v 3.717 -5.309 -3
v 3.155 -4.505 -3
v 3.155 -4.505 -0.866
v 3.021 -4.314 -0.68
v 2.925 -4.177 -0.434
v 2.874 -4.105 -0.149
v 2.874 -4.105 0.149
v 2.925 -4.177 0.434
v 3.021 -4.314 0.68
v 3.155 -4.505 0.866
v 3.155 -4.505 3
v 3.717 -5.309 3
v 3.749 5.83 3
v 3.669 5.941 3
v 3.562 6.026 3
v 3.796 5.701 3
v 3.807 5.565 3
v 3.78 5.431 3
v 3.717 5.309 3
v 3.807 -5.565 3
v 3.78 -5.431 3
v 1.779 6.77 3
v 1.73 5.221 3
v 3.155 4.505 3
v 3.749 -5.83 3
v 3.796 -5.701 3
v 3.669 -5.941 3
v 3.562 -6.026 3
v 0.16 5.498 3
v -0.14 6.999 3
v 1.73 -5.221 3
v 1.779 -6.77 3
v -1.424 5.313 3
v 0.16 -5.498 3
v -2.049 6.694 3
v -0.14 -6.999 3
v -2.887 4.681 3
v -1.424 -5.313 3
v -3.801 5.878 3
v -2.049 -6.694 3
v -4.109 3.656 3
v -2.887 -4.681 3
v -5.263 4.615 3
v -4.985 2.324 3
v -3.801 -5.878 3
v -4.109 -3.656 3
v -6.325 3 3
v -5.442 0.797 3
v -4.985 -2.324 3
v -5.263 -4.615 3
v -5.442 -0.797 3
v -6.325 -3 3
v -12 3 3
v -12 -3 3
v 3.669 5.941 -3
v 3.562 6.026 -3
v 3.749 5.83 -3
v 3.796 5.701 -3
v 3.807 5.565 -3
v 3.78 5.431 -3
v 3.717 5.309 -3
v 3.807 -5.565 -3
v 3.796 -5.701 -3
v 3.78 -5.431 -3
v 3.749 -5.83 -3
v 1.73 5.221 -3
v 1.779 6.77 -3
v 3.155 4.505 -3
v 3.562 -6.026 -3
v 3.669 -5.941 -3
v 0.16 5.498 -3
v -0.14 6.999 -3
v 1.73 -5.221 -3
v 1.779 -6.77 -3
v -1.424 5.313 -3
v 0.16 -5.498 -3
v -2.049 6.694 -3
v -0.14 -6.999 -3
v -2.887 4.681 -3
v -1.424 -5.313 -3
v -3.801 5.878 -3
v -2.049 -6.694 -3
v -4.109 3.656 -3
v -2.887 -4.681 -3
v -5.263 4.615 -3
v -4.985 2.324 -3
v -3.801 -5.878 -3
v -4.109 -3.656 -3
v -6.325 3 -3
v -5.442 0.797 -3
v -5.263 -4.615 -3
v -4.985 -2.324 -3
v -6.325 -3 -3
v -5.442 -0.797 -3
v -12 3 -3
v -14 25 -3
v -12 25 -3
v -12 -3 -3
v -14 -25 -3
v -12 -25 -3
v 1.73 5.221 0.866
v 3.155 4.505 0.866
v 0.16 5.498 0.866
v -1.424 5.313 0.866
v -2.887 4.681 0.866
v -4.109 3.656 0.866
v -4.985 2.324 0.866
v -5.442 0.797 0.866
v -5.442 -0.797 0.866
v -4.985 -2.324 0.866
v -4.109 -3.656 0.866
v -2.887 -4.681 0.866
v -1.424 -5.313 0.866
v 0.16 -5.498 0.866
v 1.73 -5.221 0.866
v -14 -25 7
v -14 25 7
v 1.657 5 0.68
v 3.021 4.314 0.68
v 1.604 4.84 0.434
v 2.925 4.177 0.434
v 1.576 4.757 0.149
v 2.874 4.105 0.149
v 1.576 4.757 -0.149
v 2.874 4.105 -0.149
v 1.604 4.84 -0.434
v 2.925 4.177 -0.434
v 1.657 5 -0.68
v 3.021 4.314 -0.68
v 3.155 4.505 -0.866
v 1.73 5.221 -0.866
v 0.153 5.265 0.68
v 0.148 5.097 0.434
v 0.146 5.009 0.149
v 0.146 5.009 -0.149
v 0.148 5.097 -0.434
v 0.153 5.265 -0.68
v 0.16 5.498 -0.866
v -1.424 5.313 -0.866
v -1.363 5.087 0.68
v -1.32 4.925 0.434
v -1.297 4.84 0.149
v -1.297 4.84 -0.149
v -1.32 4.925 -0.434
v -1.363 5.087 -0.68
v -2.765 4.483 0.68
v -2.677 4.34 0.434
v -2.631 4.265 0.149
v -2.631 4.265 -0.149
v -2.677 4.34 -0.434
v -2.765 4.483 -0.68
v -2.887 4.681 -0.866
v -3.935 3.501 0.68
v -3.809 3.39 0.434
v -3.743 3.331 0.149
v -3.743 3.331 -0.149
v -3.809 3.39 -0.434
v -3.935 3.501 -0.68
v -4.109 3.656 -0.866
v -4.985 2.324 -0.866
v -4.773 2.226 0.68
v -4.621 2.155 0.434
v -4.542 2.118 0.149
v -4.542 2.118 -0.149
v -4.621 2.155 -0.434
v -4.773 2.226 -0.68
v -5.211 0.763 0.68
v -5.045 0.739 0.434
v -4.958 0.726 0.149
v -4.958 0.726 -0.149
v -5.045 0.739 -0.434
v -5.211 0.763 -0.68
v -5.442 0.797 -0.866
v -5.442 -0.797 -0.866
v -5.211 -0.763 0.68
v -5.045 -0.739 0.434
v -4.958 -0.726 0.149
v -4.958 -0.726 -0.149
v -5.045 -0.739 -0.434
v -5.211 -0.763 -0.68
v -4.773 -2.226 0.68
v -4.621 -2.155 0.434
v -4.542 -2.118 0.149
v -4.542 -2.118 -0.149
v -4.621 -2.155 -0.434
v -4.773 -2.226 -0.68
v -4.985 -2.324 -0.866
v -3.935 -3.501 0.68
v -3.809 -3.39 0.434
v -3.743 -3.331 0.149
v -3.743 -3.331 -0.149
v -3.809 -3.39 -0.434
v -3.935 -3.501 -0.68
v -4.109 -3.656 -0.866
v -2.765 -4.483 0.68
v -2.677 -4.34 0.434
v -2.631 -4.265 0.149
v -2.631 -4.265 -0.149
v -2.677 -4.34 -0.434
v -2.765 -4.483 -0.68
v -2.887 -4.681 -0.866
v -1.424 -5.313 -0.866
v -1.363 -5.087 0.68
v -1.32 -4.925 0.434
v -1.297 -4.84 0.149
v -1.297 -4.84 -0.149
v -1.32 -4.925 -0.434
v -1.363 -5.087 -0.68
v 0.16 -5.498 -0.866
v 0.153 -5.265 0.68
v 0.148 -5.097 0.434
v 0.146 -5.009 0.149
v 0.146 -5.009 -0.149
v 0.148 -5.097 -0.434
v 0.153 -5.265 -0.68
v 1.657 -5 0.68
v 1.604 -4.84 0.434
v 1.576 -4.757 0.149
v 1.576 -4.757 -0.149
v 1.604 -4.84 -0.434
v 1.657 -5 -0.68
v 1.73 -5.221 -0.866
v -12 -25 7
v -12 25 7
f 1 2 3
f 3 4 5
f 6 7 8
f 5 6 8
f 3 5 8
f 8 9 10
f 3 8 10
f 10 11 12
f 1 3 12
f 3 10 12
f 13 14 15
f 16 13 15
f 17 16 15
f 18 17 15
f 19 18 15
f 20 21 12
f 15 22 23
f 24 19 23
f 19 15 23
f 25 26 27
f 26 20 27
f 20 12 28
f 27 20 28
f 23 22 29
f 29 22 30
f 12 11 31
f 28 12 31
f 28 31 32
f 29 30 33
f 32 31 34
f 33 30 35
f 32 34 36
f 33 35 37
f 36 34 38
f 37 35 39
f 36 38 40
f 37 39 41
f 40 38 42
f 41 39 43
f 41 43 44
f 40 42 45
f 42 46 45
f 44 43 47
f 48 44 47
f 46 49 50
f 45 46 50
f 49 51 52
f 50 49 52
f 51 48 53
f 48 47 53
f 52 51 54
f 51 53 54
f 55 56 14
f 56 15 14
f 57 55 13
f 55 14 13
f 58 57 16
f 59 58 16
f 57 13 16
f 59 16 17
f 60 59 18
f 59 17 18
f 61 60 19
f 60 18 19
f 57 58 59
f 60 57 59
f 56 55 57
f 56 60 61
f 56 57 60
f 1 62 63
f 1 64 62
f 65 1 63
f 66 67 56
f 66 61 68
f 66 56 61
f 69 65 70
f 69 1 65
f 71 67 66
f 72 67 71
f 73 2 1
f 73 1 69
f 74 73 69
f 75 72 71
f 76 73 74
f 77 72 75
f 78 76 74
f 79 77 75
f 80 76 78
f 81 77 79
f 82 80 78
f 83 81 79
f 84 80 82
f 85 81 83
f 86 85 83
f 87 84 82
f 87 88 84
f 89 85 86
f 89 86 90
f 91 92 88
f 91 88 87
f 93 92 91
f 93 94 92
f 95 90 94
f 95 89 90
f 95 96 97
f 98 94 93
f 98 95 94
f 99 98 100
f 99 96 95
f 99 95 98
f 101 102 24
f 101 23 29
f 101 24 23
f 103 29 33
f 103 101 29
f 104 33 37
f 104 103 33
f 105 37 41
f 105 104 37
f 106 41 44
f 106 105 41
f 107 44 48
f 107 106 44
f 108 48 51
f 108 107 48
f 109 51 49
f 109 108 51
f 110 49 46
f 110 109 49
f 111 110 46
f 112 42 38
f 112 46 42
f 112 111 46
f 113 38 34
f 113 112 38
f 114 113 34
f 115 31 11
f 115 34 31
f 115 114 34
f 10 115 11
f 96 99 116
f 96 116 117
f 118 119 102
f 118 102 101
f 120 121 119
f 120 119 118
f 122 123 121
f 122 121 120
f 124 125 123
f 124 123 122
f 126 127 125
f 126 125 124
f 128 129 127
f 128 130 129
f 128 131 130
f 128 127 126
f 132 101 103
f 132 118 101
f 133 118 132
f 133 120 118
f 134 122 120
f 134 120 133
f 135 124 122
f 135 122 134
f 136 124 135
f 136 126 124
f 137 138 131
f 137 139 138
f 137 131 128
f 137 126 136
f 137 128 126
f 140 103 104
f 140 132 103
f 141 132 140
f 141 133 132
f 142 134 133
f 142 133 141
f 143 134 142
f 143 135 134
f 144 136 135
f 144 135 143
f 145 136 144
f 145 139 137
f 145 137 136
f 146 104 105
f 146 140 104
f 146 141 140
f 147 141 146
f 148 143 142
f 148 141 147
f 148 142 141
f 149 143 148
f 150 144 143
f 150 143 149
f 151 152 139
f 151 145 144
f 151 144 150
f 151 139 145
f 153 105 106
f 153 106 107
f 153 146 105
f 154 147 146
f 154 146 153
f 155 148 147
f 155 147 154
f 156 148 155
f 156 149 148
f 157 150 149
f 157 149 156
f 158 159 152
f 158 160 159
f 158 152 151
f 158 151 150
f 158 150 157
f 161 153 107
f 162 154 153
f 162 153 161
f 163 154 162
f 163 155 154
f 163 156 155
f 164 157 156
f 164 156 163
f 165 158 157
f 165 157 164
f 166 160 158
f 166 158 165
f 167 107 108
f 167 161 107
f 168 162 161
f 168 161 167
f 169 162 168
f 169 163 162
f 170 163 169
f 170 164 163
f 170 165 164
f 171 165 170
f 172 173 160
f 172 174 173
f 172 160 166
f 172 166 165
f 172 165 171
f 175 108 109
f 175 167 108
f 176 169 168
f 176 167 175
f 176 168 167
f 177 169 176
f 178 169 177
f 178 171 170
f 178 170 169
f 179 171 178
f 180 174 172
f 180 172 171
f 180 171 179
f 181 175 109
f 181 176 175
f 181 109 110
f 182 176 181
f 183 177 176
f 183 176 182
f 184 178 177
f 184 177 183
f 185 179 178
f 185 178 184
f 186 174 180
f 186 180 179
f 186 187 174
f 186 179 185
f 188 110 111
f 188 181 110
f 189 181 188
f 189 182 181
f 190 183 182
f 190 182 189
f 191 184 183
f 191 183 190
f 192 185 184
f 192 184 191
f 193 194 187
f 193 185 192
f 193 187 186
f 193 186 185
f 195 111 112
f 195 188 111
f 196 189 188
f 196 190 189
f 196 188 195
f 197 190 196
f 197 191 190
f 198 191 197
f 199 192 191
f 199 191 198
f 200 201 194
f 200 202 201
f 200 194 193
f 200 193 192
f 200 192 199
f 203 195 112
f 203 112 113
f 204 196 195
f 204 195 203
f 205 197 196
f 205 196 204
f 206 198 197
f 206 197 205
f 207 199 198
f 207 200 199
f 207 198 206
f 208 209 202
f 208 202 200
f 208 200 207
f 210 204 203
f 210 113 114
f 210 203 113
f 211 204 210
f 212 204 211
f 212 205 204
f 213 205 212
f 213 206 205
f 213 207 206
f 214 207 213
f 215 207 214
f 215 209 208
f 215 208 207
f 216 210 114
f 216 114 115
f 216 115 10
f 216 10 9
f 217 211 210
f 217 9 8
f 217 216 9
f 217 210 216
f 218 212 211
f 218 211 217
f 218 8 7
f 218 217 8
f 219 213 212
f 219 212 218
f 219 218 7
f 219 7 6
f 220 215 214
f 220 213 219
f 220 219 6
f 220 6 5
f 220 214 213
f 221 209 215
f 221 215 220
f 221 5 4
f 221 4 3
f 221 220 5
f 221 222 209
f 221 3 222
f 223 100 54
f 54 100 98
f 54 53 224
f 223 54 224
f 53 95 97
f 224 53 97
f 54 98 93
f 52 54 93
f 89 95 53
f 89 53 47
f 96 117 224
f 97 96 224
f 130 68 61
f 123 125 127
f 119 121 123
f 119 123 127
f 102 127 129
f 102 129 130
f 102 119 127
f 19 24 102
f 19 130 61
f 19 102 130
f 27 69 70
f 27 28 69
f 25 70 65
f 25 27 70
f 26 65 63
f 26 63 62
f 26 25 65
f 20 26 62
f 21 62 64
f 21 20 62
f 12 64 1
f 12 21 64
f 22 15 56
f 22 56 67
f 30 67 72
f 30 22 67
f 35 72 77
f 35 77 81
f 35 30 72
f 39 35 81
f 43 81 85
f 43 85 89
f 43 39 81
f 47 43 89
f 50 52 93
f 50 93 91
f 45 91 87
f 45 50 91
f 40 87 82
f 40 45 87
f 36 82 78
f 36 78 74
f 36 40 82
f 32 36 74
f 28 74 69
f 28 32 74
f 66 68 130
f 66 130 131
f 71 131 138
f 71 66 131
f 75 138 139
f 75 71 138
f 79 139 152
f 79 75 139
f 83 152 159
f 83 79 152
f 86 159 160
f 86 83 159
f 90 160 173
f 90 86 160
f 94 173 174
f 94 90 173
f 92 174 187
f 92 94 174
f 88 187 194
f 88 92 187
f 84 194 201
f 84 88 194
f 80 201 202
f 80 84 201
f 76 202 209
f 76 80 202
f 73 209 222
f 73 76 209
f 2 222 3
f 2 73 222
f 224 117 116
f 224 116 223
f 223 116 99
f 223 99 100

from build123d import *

# Parameters (mm, degrees)
TORUS_R                = 1
CYLINDER_R             = 5.5
CYLINDER_DEPTH         = 36
FILLET_R               = 4
CYLINDER002_W          = 7
CYLINDER002_H          = 6
CYLINDER002_ANGLE      = 250
FILLET001_R            = 0.5
CUT001_PLACEMENT_ANGLE = 55
BOX_W                  = 8
BOX_H                  = 6
BOX_DEPTH              = 6
BOX001_W               = 2
BOX001_H               = 50
BOX001_DEPTH           = 10


with BuildPart() as toro:
    # Torus → Torus (revolve)
    with BuildSketch(Plane(origin=(0, 0, 26), x_dir=(1, 0, 0), z_dir=(0, -1, 0))):
        with Locations((6, 0)):
            Circle(TORUS_R)
    revolve(axis=Axis((0, 0, 26), (0, 0, 1)))


with BuildPart() as led:
    # Cylinder → Cylinder (new body)
    with BuildSketch(Plane.XY):
        Circle(CYLINDER_R)
    extrude(amount=CYLINDER_DEPTH)

    # Fillet
    fillet_edges = [led.edges().sort_by_distance(p)[0] for p in [
        (-5.5, 0, 36),
    ]]
    fillet(fillet_edges, radius=FILLET_R)

    # Cut: cut Toro
    add(toro.part, mode=Mode.SUBTRACT)


with BuildPart() as anilla:
    # Cylinder002 → Cylinder002 (revolve)
    with BuildSketch(Plane(origin=(0, 0, 4), x_dir=(1, 0, 0), z_dir=(0, -1, 0))):
        with Locations((3.5, 3)):
            Rectangle(CYLINDER002_W, CYLINDER002_H)
    revolve(axis=Axis((0, 0, 4), (0, 0, 1)), revolution_arc=CYLINDER002_ANGLE)

    # Fillet001
    fillet001_edges = [anilla.edges().sort_by_distance(p)[0] for p in [
        (-2.394141, -6.577848, 7),
        (7, 0, 7),
    ]]
    fillet(fillet001_edges, radius=FILLET001_R)


with BuildPart() as anilla_1:
    # Fillet001 placement: moved
    add(anilla.part.moved(Location((0, 0, 19))))

    # Cut001: cut led
    add(led.part, mode=Mode.SUBTRACT)


with BuildPart() as anilla_2:
    # Cut001 placement: moved
    add(anilla_1.part.moved(Location((0, 0, -26))).rotate(Axis((0, 0, -26), (0, 0, 1)), CUT001_PLACEMENT_ANGLE))


with BuildPart() as fusion:
    # Box → Box (new body)
    with BuildSketch(Plane(origin=(-14, -3, -3), x_dir=(1, 0, 0), z_dir=(0, 0, 1))):
        with Locations((4, 3)):
            Rectangle(BOX_W, BOX_H)
    extrude(amount=BOX_DEPTH)

    # Fusion: union anilla
    add(anilla_2.part)


with BuildPart() as clone_of_eslabon:
    # Box001 → Box001 (new body)
    with BuildSketch(Plane(origin=(-14, -25, -3), x_dir=(1, 0, 0), z_dir=(0, 0, 1))):
        with Locations((1, 25)):
            Rectangle(BOX001_W, BOX001_H)
    extrude(amount=BOX001_DEPTH)

    # Fusion001: union Fusion
    add(fusion.part)


solid = clone_of_eslabon.part
